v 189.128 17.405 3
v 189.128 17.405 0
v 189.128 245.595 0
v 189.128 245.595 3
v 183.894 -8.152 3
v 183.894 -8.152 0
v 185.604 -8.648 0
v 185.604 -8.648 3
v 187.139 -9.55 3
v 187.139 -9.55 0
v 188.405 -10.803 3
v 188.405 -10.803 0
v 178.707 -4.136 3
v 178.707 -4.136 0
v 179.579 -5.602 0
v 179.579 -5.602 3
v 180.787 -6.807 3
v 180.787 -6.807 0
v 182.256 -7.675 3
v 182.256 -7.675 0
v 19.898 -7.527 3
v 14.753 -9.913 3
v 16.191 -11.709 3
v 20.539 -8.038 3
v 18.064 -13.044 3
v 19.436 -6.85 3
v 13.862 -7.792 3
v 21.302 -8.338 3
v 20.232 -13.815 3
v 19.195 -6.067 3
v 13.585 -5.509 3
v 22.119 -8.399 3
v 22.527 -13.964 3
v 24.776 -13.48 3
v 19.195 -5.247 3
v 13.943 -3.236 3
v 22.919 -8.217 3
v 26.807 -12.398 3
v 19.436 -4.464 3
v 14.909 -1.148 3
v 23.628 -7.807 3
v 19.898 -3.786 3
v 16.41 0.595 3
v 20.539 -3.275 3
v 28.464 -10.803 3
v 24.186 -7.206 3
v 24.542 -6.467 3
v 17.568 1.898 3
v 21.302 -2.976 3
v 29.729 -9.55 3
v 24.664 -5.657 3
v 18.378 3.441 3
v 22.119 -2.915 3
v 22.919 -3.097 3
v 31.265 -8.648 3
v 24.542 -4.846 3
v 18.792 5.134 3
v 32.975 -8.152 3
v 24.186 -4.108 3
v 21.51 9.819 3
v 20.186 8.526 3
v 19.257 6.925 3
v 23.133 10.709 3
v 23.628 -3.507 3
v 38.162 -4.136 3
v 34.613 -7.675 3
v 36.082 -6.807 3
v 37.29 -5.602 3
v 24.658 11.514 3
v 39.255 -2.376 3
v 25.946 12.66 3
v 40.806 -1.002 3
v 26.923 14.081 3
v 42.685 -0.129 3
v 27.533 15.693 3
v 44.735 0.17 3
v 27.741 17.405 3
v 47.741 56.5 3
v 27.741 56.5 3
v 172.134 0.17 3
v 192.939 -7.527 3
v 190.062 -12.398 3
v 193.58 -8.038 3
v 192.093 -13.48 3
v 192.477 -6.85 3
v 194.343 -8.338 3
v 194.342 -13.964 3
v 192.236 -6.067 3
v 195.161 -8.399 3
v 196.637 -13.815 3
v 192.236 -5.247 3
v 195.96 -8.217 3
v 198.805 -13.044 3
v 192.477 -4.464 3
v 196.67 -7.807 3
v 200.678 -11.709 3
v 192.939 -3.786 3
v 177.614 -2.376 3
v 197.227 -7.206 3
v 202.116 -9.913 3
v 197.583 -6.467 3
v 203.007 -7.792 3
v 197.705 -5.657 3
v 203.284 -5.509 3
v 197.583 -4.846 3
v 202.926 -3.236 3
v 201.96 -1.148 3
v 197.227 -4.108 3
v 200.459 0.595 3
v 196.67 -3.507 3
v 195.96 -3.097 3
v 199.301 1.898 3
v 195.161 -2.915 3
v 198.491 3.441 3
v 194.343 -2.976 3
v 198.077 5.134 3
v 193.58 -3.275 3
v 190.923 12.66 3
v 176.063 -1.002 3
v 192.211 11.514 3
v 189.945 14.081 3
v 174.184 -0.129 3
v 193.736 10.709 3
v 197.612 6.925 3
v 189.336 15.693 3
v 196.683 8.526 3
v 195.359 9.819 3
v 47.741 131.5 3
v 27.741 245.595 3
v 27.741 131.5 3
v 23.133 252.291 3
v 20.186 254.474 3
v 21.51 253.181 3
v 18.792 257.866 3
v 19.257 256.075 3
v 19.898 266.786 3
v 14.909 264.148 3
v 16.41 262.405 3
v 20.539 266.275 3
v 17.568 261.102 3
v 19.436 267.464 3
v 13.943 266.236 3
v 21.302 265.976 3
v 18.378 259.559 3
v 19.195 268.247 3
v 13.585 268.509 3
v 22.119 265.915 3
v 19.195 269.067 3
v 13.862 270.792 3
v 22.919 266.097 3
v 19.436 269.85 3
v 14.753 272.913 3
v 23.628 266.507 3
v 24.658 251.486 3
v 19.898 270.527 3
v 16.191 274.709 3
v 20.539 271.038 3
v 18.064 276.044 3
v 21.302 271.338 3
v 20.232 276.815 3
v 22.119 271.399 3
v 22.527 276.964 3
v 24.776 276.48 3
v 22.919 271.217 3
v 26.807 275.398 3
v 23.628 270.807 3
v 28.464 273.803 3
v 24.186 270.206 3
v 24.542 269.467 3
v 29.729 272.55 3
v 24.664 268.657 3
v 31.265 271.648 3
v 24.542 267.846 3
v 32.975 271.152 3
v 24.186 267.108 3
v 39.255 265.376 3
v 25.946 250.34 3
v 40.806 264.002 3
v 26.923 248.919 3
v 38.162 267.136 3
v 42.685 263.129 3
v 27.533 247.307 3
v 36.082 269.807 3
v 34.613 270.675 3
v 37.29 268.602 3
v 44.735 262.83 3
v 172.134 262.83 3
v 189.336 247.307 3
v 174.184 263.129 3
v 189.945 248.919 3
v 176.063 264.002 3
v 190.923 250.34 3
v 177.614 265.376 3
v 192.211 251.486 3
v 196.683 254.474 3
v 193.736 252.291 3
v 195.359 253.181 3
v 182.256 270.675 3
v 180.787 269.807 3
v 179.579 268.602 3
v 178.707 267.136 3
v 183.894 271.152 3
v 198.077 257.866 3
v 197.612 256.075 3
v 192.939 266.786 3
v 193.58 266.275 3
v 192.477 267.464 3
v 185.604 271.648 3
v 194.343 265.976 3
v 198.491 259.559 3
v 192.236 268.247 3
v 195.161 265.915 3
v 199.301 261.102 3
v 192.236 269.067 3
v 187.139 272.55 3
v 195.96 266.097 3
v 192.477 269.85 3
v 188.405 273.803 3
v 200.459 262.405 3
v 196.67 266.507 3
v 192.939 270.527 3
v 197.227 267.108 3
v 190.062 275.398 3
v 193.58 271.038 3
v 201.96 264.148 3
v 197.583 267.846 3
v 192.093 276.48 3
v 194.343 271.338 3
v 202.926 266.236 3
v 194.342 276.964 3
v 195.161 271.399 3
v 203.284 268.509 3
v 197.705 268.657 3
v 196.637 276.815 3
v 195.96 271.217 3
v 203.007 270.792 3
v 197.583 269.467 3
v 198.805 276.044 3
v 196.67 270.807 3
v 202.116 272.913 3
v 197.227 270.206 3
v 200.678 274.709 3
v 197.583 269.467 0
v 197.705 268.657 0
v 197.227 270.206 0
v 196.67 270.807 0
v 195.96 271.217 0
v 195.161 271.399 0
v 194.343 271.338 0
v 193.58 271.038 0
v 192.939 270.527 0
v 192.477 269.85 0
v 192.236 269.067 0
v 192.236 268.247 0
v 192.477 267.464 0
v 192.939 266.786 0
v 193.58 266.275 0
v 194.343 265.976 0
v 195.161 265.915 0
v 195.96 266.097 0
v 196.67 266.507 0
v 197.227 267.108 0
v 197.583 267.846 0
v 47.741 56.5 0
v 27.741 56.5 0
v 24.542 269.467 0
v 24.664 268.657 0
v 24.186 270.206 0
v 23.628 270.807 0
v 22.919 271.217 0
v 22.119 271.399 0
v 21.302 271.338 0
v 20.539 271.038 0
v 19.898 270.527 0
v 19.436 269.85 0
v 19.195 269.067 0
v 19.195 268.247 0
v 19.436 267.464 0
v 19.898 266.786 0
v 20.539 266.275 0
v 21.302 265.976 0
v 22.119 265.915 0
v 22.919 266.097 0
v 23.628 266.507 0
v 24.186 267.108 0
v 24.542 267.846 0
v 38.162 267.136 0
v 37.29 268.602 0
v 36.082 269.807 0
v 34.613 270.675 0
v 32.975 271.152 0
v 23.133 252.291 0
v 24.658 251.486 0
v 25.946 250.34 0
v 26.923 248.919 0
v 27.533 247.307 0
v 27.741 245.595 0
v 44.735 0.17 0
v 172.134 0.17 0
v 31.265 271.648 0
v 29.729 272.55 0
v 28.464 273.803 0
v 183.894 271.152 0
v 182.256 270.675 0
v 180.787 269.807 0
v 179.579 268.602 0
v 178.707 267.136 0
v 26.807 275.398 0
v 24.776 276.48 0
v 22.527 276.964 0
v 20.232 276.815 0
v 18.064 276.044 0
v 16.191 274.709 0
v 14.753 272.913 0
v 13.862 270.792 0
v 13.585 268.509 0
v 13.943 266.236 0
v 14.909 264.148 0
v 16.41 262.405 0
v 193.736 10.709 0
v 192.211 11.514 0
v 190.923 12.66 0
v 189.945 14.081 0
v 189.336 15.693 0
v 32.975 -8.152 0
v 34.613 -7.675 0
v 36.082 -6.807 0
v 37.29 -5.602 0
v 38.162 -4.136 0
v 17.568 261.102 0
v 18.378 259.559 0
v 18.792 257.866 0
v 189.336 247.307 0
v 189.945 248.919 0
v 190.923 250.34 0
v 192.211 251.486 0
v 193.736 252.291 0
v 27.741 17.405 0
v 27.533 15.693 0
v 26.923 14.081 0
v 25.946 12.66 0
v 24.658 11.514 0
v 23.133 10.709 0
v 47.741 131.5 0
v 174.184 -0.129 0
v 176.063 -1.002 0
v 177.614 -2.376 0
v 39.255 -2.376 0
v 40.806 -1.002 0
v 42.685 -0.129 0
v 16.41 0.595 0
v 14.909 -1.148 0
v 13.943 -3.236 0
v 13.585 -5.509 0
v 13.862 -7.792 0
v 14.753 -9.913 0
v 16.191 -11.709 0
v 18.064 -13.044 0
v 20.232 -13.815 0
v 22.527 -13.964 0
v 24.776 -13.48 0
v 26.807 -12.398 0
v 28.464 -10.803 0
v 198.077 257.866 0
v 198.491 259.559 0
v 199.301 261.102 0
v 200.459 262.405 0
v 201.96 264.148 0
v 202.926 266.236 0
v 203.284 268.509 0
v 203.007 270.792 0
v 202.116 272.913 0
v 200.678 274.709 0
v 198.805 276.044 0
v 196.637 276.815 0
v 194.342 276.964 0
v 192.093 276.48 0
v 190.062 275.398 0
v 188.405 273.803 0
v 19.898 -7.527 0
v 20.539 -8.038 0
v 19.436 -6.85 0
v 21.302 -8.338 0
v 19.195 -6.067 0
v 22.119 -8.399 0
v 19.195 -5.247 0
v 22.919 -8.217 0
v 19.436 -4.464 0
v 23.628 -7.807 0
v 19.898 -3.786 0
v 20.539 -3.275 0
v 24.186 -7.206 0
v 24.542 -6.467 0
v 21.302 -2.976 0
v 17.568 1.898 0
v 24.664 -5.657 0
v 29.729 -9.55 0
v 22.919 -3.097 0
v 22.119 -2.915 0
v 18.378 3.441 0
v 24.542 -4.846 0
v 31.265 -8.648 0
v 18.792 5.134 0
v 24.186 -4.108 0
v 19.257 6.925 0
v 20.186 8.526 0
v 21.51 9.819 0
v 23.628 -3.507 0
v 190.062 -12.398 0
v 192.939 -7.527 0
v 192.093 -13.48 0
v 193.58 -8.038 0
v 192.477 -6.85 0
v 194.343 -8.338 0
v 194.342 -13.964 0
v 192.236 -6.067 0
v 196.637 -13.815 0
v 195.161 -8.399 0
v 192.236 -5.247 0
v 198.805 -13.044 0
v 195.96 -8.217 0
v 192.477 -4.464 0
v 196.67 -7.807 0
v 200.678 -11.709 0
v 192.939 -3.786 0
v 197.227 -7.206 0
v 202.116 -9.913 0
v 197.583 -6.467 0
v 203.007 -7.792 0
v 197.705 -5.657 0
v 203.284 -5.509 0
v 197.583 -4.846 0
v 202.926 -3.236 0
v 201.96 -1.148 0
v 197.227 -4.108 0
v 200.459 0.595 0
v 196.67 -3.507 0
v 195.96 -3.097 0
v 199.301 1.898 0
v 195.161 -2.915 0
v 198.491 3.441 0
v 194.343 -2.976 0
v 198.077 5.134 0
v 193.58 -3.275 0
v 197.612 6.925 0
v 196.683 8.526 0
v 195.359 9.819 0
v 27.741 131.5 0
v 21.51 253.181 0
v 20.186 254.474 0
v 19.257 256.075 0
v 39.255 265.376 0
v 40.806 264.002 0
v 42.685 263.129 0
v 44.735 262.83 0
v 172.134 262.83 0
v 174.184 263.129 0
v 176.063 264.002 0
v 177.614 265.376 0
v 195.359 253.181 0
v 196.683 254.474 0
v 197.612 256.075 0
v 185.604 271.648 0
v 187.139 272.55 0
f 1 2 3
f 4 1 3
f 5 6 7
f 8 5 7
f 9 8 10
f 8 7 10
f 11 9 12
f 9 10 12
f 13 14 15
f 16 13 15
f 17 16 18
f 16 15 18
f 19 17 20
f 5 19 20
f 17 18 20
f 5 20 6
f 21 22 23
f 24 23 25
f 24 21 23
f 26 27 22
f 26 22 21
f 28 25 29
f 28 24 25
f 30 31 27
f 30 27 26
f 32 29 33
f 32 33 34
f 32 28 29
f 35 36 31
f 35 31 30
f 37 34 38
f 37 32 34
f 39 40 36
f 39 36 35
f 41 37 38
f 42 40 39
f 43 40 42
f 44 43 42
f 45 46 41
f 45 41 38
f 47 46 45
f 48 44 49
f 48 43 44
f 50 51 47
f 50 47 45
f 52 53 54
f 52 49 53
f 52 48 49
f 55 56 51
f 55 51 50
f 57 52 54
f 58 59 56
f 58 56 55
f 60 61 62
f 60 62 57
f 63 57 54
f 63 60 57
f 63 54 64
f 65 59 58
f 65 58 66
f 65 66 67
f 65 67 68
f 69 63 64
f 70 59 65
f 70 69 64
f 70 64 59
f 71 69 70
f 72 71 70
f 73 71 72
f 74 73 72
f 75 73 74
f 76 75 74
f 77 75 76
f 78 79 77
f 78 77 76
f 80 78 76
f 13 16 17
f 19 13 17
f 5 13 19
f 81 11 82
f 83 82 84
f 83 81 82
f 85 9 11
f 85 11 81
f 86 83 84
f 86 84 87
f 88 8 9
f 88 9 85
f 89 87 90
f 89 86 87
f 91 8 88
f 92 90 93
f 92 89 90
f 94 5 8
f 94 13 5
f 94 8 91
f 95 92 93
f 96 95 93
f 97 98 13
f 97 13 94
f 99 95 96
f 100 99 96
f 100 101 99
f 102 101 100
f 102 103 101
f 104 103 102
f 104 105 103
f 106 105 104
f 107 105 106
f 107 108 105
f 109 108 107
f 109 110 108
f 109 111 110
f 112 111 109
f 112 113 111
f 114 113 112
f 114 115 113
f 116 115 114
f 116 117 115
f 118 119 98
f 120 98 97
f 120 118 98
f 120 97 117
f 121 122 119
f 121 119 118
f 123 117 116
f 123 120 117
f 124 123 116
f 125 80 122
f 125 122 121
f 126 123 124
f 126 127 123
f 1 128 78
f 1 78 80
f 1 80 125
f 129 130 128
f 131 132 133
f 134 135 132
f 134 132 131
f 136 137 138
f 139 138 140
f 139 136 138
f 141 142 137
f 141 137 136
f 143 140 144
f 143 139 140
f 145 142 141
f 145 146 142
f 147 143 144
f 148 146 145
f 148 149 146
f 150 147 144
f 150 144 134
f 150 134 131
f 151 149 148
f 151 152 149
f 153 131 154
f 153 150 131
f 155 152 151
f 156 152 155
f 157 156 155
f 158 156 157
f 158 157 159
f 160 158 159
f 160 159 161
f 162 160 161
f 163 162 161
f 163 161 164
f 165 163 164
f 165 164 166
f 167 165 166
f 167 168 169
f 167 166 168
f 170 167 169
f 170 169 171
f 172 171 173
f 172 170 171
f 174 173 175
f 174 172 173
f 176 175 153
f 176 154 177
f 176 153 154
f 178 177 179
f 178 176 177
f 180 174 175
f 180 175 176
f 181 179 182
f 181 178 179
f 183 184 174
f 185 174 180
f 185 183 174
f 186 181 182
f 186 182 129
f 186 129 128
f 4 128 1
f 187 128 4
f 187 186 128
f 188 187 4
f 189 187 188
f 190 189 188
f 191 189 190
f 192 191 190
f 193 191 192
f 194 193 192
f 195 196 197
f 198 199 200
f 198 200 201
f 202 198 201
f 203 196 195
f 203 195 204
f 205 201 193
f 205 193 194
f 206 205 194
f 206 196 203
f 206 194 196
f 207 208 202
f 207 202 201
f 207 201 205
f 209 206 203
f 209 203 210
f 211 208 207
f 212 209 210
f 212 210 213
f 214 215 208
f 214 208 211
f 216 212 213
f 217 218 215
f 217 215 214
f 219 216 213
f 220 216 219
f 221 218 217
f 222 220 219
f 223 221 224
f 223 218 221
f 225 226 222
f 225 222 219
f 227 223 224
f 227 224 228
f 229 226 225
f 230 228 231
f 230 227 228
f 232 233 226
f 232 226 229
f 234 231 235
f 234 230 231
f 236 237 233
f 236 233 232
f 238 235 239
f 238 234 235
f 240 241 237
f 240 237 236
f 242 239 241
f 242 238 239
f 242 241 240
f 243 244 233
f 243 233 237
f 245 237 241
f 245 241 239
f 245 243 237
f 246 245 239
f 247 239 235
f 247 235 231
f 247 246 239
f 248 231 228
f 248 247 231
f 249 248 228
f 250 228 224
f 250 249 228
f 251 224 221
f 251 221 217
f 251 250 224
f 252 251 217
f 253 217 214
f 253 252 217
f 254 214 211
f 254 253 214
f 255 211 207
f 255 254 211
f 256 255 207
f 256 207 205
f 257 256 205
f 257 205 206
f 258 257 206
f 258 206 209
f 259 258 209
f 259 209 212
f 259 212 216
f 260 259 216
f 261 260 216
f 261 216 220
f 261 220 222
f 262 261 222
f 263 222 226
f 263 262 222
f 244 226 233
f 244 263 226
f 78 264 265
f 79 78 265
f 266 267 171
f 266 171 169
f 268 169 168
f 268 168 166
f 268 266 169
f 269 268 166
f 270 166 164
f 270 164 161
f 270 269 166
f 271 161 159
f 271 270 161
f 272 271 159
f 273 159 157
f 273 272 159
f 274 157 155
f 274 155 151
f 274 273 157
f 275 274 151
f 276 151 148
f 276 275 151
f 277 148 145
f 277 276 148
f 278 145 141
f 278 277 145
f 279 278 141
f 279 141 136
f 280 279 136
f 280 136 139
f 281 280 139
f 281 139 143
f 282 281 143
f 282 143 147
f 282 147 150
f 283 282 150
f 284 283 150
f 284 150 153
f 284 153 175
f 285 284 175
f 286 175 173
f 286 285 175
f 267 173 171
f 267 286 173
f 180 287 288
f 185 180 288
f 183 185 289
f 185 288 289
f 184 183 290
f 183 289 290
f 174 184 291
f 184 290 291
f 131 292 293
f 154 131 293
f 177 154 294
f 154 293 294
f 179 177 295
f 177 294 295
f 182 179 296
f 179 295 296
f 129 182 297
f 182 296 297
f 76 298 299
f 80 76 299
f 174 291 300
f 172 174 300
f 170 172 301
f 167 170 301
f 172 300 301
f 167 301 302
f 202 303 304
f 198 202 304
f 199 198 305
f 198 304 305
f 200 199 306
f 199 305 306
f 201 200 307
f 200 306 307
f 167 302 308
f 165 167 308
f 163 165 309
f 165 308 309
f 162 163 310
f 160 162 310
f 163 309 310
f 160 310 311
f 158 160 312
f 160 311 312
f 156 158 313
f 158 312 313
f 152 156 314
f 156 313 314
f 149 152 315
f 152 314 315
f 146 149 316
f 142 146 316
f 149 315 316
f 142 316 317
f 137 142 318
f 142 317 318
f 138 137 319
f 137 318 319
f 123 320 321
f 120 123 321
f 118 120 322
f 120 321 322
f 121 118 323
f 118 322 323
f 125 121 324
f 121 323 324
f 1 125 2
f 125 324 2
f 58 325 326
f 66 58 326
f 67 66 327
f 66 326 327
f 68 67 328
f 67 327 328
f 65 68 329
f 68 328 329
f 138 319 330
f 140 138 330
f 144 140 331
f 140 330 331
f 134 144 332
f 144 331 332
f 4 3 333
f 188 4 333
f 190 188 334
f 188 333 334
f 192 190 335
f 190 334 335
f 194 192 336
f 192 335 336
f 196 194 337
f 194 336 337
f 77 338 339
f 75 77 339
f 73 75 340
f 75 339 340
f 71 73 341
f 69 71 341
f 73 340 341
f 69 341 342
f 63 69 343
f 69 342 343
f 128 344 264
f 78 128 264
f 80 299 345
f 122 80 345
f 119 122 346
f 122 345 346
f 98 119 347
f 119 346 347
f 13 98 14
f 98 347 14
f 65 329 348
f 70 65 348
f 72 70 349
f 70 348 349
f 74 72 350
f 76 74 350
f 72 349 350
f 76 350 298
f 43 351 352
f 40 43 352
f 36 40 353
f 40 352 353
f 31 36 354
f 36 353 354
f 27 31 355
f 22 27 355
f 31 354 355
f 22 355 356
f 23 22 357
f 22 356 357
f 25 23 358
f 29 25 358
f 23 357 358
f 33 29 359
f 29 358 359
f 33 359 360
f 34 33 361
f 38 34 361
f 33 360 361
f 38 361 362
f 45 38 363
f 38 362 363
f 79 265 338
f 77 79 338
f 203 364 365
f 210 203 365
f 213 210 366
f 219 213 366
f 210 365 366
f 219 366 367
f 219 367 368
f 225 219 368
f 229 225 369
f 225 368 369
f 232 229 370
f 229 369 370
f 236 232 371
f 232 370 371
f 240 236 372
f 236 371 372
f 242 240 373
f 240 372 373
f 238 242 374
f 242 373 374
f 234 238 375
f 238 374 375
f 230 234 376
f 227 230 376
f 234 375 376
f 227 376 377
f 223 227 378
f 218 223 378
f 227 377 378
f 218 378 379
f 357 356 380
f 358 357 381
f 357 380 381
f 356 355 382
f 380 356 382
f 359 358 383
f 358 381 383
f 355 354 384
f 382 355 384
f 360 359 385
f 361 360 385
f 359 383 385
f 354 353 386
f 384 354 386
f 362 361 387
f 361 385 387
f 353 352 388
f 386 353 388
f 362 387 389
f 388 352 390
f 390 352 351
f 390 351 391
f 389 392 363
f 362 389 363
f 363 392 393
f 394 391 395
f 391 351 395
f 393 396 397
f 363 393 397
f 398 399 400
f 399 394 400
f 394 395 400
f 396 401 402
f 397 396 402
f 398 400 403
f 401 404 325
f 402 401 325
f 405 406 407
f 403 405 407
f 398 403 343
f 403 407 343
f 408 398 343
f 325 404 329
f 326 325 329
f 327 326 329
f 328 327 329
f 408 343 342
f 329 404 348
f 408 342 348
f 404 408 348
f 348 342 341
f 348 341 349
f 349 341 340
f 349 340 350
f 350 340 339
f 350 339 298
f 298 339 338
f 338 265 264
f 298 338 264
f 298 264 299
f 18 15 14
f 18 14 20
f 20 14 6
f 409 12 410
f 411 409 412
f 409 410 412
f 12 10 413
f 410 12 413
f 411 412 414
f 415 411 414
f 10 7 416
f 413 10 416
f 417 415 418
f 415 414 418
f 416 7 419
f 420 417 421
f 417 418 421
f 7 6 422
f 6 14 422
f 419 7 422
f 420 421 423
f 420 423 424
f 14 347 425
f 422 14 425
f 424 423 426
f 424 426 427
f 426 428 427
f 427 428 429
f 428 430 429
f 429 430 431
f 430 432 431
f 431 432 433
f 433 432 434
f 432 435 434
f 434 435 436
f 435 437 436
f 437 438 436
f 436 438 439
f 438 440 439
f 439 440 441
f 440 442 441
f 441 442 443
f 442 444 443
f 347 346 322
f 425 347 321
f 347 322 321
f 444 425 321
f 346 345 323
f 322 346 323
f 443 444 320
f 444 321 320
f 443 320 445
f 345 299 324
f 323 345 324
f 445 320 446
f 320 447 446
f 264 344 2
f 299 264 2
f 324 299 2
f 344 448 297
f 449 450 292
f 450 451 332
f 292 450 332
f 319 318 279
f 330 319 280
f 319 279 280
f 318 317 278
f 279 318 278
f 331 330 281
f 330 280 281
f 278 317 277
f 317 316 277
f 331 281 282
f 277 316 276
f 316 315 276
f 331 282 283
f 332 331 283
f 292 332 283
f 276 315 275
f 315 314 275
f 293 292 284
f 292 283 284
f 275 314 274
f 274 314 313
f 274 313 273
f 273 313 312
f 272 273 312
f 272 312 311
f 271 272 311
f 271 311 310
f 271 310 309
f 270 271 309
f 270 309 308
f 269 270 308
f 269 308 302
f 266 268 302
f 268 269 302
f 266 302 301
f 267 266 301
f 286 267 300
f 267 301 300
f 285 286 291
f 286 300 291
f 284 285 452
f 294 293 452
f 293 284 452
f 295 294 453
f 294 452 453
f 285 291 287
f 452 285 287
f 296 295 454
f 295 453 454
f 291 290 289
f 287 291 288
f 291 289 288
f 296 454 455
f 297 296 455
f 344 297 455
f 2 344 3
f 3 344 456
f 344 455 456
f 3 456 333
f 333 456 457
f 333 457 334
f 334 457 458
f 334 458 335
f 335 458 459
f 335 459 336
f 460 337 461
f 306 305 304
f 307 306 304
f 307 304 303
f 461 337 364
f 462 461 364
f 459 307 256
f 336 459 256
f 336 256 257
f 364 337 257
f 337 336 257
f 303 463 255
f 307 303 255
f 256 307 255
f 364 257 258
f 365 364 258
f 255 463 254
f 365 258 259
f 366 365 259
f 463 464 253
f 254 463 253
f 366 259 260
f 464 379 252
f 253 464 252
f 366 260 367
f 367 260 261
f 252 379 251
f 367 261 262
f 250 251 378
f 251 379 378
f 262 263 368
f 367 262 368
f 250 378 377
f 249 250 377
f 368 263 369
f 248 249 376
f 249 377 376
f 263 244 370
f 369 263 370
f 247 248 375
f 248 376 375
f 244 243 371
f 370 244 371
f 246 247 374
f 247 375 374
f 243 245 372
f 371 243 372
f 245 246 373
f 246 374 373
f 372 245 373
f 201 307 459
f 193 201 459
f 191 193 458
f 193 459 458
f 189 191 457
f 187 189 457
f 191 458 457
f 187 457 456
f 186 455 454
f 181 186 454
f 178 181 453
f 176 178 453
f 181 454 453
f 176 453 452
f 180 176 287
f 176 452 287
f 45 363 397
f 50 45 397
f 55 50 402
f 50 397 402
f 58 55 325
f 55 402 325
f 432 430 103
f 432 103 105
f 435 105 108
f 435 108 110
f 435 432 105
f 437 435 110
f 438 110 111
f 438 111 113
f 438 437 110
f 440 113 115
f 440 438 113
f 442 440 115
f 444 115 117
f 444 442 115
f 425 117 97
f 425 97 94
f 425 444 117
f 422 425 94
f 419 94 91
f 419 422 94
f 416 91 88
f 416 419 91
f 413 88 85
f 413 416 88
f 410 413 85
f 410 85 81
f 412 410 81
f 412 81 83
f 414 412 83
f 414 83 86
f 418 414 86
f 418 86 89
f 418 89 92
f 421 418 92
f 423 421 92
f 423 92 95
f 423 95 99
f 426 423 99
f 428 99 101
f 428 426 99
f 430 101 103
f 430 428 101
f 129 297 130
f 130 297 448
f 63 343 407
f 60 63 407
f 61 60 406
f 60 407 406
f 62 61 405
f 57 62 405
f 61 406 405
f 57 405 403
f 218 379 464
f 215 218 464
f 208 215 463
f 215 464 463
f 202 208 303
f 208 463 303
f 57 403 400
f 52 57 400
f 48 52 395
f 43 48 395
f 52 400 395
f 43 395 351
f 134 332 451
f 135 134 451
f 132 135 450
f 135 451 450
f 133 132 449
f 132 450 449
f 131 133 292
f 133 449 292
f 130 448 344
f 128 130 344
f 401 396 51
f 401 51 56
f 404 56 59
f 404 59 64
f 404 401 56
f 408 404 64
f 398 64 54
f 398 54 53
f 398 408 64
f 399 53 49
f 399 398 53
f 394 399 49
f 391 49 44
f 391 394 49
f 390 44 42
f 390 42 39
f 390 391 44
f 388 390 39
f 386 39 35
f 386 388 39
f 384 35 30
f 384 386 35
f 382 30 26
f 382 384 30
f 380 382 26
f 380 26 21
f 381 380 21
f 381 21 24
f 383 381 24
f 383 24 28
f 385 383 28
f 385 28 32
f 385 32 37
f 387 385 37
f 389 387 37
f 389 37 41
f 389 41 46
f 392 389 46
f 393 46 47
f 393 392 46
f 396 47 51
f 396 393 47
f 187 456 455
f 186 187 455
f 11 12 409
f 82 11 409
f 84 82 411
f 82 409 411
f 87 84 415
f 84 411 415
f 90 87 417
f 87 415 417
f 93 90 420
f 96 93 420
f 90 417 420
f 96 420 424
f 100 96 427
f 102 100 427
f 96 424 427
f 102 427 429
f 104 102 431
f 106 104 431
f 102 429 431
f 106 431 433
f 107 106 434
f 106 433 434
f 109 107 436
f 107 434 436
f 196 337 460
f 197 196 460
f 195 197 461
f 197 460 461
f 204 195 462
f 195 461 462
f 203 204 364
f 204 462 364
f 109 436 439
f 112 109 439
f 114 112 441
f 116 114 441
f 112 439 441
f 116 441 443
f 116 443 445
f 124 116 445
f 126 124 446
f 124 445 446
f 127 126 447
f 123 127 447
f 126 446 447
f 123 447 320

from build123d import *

# Parameters (mm, degrees)
SKETCH2_R           = 2.75
BOSS_EXTRUDE2_DEPTH = 3


with BuildPart() as part:
    # Sketch2 → Boss-Extrude2 (new body)
    with BuildSketch(Plane.XY):
        with BuildLine():
            Line((27.74070529, 245.594851313), (27.74070529, 131.5))
            Line((27.74070529, 131.5), (47.74070529, 131.5))
            Line((47.74070529, 131.5), (47.74070529, 56.5))
            Line((47.74070529, 56.5), (27.74070529, 56.5))
            Line((27.74070529, 56.5), (27.74070529, 17.405148687))
            ThreePointArc((27.74070529, 17.405148687), (26.47762478, 13.3410126), (23.133396465, 10.708768028))
            ThreePointArc((23.133396465, 10.708768028), (20.1856831, 8.526218264), (18.792007247, 5.133548935))
            ThreePointArc((18.792007247, 5.133548935), (18.020142632, 2.644369817), (16.409580407, 0.595497692))
            ThreePointArc((16.409580407, 0.595497692), (16.190613984, -11.709412188), (28.464054129, -10.803089717))
            ThreePointArc((28.464054129, -10.803089717), (30.468885152, -9.051370379), (32.974636764, -8.151883342))
            ThreePointArc((32.974636764, -8.151883342), (36.082059553, -6.807278123), (38.161890453, -4.135510355))
            ThreePointArc((38.161890453, -4.135510355), (40.806062267, -1.002196621), (44.734834928, 0.17))
            Line((44.734834928, 0.17), (172.134078399, 0.17))
            ThreePointArc((172.134078399, 0.17), (176.06285106, -1.002196621), (178.707022874, -4.135510355))
            ThreePointArc((178.707022874, -4.135510355), (180.786853774, -6.807278123), (183.894276563, -8.151883342))
            ThreePointArc((183.894276563, -8.151883342), (186.400028175, -9.051370379), (188.404859198, -10.803089717))
            ThreePointArc((188.404859198, -10.803089717), (200.678299343, -11.709412188), (200.45933292, 0.595497692))
            ThreePointArc((200.45933292, 0.595497692), (198.848770695, 2.644369817), (198.076906079, 5.133548935))
            ThreePointArc((198.076906079, 5.133548935), (196.683230227, 8.526218264), (193.735516862, 10.708768028))
            ThreePointArc((193.735516862, 10.708768028), (190.391288547, 13.3410126), (189.128208037, 17.405148687))
            Line((189.128208037, 17.405148687), (189.128208037, 245.594851313))
            ThreePointArc((189.128208037, 245.594851313), (190.391288547, 249.6589874), (193.735516862, 252.291231972))
            ThreePointArc((193.735516862, 252.291231972), (196.683230227, 254.473781736), (198.076906079, 257.866451065))
            ThreePointArc((198.076906079, 257.866451065), (198.848770695, 260.355630183), (200.45933292, 262.404502308))
            ThreePointArc((200.45933292, 262.404502308), (200.678299343, 274.709412188), (188.404859198, 273.803089717))
            ThreePointArc((188.404859198, 273.803089717), (186.400028175, 272.051370379), (183.894276563, 271.151883342))
            ThreePointArc((183.894276563, 271.151883342), (180.786853774, 269.807278123), (178.707022874, 267.135510355))
            ThreePointArc((178.707022874, 267.135510355), (176.06285106, 264.002196621), (172.134078399, 262.83))
            Line((172.134078399, 262.83), (44.734834928, 262.83))
            ThreePointArc((44.734834928, 262.83), (40.806062267, 264.002196621), (38.161890453, 267.135510355))
            ThreePointArc((38.161890453, 267.135510355), (36.082059553, 269.807278123), (32.974636764, 271.151883342))
            ThreePointArc((32.974636764, 271.151883342), (30.468885152, 272.051370379), (28.464054129, 273.803089717))
            ThreePointArc((28.464054129, 273.803089717), (16.190613984, 274.709412188), (16.409580407, 262.404502308))
            ThreePointArc((16.409580407, 262.404502308), (18.020142632, 260.355630183), (18.792007247, 257.866451065))
            ThreePointArc((18.792007247, 257.866451065), (20.1856831, 254.473781736), (23.133396465, 252.291231972))
            ThreePointArc((23.133396465, 252.291231972), (26.47762478, 249.6589874), (27.74070529, 245.594851313))
        make_face()
        with Locations((21.91385104, -5.656854249)):
            Circle(SKETCH2_R, mode=Mode.SUBTRACT)
        with Locations((194.955062287, -5.656854249)):
            Circle(SKETCH2_R, mode=Mode.SUBTRACT)
        with Locations((21.91385104, 268.656854249)):
            Circle(SKETCH2_R, mode=Mode.SUBTRACT)
        with Locations((194.955062287, 268.656854249)):
            Circle(SKETCH2_R, mode=Mode.SUBTRACT)
    extrude(amount=BOSS_EXTRUDE2_DEPTH)


solid = part.part
